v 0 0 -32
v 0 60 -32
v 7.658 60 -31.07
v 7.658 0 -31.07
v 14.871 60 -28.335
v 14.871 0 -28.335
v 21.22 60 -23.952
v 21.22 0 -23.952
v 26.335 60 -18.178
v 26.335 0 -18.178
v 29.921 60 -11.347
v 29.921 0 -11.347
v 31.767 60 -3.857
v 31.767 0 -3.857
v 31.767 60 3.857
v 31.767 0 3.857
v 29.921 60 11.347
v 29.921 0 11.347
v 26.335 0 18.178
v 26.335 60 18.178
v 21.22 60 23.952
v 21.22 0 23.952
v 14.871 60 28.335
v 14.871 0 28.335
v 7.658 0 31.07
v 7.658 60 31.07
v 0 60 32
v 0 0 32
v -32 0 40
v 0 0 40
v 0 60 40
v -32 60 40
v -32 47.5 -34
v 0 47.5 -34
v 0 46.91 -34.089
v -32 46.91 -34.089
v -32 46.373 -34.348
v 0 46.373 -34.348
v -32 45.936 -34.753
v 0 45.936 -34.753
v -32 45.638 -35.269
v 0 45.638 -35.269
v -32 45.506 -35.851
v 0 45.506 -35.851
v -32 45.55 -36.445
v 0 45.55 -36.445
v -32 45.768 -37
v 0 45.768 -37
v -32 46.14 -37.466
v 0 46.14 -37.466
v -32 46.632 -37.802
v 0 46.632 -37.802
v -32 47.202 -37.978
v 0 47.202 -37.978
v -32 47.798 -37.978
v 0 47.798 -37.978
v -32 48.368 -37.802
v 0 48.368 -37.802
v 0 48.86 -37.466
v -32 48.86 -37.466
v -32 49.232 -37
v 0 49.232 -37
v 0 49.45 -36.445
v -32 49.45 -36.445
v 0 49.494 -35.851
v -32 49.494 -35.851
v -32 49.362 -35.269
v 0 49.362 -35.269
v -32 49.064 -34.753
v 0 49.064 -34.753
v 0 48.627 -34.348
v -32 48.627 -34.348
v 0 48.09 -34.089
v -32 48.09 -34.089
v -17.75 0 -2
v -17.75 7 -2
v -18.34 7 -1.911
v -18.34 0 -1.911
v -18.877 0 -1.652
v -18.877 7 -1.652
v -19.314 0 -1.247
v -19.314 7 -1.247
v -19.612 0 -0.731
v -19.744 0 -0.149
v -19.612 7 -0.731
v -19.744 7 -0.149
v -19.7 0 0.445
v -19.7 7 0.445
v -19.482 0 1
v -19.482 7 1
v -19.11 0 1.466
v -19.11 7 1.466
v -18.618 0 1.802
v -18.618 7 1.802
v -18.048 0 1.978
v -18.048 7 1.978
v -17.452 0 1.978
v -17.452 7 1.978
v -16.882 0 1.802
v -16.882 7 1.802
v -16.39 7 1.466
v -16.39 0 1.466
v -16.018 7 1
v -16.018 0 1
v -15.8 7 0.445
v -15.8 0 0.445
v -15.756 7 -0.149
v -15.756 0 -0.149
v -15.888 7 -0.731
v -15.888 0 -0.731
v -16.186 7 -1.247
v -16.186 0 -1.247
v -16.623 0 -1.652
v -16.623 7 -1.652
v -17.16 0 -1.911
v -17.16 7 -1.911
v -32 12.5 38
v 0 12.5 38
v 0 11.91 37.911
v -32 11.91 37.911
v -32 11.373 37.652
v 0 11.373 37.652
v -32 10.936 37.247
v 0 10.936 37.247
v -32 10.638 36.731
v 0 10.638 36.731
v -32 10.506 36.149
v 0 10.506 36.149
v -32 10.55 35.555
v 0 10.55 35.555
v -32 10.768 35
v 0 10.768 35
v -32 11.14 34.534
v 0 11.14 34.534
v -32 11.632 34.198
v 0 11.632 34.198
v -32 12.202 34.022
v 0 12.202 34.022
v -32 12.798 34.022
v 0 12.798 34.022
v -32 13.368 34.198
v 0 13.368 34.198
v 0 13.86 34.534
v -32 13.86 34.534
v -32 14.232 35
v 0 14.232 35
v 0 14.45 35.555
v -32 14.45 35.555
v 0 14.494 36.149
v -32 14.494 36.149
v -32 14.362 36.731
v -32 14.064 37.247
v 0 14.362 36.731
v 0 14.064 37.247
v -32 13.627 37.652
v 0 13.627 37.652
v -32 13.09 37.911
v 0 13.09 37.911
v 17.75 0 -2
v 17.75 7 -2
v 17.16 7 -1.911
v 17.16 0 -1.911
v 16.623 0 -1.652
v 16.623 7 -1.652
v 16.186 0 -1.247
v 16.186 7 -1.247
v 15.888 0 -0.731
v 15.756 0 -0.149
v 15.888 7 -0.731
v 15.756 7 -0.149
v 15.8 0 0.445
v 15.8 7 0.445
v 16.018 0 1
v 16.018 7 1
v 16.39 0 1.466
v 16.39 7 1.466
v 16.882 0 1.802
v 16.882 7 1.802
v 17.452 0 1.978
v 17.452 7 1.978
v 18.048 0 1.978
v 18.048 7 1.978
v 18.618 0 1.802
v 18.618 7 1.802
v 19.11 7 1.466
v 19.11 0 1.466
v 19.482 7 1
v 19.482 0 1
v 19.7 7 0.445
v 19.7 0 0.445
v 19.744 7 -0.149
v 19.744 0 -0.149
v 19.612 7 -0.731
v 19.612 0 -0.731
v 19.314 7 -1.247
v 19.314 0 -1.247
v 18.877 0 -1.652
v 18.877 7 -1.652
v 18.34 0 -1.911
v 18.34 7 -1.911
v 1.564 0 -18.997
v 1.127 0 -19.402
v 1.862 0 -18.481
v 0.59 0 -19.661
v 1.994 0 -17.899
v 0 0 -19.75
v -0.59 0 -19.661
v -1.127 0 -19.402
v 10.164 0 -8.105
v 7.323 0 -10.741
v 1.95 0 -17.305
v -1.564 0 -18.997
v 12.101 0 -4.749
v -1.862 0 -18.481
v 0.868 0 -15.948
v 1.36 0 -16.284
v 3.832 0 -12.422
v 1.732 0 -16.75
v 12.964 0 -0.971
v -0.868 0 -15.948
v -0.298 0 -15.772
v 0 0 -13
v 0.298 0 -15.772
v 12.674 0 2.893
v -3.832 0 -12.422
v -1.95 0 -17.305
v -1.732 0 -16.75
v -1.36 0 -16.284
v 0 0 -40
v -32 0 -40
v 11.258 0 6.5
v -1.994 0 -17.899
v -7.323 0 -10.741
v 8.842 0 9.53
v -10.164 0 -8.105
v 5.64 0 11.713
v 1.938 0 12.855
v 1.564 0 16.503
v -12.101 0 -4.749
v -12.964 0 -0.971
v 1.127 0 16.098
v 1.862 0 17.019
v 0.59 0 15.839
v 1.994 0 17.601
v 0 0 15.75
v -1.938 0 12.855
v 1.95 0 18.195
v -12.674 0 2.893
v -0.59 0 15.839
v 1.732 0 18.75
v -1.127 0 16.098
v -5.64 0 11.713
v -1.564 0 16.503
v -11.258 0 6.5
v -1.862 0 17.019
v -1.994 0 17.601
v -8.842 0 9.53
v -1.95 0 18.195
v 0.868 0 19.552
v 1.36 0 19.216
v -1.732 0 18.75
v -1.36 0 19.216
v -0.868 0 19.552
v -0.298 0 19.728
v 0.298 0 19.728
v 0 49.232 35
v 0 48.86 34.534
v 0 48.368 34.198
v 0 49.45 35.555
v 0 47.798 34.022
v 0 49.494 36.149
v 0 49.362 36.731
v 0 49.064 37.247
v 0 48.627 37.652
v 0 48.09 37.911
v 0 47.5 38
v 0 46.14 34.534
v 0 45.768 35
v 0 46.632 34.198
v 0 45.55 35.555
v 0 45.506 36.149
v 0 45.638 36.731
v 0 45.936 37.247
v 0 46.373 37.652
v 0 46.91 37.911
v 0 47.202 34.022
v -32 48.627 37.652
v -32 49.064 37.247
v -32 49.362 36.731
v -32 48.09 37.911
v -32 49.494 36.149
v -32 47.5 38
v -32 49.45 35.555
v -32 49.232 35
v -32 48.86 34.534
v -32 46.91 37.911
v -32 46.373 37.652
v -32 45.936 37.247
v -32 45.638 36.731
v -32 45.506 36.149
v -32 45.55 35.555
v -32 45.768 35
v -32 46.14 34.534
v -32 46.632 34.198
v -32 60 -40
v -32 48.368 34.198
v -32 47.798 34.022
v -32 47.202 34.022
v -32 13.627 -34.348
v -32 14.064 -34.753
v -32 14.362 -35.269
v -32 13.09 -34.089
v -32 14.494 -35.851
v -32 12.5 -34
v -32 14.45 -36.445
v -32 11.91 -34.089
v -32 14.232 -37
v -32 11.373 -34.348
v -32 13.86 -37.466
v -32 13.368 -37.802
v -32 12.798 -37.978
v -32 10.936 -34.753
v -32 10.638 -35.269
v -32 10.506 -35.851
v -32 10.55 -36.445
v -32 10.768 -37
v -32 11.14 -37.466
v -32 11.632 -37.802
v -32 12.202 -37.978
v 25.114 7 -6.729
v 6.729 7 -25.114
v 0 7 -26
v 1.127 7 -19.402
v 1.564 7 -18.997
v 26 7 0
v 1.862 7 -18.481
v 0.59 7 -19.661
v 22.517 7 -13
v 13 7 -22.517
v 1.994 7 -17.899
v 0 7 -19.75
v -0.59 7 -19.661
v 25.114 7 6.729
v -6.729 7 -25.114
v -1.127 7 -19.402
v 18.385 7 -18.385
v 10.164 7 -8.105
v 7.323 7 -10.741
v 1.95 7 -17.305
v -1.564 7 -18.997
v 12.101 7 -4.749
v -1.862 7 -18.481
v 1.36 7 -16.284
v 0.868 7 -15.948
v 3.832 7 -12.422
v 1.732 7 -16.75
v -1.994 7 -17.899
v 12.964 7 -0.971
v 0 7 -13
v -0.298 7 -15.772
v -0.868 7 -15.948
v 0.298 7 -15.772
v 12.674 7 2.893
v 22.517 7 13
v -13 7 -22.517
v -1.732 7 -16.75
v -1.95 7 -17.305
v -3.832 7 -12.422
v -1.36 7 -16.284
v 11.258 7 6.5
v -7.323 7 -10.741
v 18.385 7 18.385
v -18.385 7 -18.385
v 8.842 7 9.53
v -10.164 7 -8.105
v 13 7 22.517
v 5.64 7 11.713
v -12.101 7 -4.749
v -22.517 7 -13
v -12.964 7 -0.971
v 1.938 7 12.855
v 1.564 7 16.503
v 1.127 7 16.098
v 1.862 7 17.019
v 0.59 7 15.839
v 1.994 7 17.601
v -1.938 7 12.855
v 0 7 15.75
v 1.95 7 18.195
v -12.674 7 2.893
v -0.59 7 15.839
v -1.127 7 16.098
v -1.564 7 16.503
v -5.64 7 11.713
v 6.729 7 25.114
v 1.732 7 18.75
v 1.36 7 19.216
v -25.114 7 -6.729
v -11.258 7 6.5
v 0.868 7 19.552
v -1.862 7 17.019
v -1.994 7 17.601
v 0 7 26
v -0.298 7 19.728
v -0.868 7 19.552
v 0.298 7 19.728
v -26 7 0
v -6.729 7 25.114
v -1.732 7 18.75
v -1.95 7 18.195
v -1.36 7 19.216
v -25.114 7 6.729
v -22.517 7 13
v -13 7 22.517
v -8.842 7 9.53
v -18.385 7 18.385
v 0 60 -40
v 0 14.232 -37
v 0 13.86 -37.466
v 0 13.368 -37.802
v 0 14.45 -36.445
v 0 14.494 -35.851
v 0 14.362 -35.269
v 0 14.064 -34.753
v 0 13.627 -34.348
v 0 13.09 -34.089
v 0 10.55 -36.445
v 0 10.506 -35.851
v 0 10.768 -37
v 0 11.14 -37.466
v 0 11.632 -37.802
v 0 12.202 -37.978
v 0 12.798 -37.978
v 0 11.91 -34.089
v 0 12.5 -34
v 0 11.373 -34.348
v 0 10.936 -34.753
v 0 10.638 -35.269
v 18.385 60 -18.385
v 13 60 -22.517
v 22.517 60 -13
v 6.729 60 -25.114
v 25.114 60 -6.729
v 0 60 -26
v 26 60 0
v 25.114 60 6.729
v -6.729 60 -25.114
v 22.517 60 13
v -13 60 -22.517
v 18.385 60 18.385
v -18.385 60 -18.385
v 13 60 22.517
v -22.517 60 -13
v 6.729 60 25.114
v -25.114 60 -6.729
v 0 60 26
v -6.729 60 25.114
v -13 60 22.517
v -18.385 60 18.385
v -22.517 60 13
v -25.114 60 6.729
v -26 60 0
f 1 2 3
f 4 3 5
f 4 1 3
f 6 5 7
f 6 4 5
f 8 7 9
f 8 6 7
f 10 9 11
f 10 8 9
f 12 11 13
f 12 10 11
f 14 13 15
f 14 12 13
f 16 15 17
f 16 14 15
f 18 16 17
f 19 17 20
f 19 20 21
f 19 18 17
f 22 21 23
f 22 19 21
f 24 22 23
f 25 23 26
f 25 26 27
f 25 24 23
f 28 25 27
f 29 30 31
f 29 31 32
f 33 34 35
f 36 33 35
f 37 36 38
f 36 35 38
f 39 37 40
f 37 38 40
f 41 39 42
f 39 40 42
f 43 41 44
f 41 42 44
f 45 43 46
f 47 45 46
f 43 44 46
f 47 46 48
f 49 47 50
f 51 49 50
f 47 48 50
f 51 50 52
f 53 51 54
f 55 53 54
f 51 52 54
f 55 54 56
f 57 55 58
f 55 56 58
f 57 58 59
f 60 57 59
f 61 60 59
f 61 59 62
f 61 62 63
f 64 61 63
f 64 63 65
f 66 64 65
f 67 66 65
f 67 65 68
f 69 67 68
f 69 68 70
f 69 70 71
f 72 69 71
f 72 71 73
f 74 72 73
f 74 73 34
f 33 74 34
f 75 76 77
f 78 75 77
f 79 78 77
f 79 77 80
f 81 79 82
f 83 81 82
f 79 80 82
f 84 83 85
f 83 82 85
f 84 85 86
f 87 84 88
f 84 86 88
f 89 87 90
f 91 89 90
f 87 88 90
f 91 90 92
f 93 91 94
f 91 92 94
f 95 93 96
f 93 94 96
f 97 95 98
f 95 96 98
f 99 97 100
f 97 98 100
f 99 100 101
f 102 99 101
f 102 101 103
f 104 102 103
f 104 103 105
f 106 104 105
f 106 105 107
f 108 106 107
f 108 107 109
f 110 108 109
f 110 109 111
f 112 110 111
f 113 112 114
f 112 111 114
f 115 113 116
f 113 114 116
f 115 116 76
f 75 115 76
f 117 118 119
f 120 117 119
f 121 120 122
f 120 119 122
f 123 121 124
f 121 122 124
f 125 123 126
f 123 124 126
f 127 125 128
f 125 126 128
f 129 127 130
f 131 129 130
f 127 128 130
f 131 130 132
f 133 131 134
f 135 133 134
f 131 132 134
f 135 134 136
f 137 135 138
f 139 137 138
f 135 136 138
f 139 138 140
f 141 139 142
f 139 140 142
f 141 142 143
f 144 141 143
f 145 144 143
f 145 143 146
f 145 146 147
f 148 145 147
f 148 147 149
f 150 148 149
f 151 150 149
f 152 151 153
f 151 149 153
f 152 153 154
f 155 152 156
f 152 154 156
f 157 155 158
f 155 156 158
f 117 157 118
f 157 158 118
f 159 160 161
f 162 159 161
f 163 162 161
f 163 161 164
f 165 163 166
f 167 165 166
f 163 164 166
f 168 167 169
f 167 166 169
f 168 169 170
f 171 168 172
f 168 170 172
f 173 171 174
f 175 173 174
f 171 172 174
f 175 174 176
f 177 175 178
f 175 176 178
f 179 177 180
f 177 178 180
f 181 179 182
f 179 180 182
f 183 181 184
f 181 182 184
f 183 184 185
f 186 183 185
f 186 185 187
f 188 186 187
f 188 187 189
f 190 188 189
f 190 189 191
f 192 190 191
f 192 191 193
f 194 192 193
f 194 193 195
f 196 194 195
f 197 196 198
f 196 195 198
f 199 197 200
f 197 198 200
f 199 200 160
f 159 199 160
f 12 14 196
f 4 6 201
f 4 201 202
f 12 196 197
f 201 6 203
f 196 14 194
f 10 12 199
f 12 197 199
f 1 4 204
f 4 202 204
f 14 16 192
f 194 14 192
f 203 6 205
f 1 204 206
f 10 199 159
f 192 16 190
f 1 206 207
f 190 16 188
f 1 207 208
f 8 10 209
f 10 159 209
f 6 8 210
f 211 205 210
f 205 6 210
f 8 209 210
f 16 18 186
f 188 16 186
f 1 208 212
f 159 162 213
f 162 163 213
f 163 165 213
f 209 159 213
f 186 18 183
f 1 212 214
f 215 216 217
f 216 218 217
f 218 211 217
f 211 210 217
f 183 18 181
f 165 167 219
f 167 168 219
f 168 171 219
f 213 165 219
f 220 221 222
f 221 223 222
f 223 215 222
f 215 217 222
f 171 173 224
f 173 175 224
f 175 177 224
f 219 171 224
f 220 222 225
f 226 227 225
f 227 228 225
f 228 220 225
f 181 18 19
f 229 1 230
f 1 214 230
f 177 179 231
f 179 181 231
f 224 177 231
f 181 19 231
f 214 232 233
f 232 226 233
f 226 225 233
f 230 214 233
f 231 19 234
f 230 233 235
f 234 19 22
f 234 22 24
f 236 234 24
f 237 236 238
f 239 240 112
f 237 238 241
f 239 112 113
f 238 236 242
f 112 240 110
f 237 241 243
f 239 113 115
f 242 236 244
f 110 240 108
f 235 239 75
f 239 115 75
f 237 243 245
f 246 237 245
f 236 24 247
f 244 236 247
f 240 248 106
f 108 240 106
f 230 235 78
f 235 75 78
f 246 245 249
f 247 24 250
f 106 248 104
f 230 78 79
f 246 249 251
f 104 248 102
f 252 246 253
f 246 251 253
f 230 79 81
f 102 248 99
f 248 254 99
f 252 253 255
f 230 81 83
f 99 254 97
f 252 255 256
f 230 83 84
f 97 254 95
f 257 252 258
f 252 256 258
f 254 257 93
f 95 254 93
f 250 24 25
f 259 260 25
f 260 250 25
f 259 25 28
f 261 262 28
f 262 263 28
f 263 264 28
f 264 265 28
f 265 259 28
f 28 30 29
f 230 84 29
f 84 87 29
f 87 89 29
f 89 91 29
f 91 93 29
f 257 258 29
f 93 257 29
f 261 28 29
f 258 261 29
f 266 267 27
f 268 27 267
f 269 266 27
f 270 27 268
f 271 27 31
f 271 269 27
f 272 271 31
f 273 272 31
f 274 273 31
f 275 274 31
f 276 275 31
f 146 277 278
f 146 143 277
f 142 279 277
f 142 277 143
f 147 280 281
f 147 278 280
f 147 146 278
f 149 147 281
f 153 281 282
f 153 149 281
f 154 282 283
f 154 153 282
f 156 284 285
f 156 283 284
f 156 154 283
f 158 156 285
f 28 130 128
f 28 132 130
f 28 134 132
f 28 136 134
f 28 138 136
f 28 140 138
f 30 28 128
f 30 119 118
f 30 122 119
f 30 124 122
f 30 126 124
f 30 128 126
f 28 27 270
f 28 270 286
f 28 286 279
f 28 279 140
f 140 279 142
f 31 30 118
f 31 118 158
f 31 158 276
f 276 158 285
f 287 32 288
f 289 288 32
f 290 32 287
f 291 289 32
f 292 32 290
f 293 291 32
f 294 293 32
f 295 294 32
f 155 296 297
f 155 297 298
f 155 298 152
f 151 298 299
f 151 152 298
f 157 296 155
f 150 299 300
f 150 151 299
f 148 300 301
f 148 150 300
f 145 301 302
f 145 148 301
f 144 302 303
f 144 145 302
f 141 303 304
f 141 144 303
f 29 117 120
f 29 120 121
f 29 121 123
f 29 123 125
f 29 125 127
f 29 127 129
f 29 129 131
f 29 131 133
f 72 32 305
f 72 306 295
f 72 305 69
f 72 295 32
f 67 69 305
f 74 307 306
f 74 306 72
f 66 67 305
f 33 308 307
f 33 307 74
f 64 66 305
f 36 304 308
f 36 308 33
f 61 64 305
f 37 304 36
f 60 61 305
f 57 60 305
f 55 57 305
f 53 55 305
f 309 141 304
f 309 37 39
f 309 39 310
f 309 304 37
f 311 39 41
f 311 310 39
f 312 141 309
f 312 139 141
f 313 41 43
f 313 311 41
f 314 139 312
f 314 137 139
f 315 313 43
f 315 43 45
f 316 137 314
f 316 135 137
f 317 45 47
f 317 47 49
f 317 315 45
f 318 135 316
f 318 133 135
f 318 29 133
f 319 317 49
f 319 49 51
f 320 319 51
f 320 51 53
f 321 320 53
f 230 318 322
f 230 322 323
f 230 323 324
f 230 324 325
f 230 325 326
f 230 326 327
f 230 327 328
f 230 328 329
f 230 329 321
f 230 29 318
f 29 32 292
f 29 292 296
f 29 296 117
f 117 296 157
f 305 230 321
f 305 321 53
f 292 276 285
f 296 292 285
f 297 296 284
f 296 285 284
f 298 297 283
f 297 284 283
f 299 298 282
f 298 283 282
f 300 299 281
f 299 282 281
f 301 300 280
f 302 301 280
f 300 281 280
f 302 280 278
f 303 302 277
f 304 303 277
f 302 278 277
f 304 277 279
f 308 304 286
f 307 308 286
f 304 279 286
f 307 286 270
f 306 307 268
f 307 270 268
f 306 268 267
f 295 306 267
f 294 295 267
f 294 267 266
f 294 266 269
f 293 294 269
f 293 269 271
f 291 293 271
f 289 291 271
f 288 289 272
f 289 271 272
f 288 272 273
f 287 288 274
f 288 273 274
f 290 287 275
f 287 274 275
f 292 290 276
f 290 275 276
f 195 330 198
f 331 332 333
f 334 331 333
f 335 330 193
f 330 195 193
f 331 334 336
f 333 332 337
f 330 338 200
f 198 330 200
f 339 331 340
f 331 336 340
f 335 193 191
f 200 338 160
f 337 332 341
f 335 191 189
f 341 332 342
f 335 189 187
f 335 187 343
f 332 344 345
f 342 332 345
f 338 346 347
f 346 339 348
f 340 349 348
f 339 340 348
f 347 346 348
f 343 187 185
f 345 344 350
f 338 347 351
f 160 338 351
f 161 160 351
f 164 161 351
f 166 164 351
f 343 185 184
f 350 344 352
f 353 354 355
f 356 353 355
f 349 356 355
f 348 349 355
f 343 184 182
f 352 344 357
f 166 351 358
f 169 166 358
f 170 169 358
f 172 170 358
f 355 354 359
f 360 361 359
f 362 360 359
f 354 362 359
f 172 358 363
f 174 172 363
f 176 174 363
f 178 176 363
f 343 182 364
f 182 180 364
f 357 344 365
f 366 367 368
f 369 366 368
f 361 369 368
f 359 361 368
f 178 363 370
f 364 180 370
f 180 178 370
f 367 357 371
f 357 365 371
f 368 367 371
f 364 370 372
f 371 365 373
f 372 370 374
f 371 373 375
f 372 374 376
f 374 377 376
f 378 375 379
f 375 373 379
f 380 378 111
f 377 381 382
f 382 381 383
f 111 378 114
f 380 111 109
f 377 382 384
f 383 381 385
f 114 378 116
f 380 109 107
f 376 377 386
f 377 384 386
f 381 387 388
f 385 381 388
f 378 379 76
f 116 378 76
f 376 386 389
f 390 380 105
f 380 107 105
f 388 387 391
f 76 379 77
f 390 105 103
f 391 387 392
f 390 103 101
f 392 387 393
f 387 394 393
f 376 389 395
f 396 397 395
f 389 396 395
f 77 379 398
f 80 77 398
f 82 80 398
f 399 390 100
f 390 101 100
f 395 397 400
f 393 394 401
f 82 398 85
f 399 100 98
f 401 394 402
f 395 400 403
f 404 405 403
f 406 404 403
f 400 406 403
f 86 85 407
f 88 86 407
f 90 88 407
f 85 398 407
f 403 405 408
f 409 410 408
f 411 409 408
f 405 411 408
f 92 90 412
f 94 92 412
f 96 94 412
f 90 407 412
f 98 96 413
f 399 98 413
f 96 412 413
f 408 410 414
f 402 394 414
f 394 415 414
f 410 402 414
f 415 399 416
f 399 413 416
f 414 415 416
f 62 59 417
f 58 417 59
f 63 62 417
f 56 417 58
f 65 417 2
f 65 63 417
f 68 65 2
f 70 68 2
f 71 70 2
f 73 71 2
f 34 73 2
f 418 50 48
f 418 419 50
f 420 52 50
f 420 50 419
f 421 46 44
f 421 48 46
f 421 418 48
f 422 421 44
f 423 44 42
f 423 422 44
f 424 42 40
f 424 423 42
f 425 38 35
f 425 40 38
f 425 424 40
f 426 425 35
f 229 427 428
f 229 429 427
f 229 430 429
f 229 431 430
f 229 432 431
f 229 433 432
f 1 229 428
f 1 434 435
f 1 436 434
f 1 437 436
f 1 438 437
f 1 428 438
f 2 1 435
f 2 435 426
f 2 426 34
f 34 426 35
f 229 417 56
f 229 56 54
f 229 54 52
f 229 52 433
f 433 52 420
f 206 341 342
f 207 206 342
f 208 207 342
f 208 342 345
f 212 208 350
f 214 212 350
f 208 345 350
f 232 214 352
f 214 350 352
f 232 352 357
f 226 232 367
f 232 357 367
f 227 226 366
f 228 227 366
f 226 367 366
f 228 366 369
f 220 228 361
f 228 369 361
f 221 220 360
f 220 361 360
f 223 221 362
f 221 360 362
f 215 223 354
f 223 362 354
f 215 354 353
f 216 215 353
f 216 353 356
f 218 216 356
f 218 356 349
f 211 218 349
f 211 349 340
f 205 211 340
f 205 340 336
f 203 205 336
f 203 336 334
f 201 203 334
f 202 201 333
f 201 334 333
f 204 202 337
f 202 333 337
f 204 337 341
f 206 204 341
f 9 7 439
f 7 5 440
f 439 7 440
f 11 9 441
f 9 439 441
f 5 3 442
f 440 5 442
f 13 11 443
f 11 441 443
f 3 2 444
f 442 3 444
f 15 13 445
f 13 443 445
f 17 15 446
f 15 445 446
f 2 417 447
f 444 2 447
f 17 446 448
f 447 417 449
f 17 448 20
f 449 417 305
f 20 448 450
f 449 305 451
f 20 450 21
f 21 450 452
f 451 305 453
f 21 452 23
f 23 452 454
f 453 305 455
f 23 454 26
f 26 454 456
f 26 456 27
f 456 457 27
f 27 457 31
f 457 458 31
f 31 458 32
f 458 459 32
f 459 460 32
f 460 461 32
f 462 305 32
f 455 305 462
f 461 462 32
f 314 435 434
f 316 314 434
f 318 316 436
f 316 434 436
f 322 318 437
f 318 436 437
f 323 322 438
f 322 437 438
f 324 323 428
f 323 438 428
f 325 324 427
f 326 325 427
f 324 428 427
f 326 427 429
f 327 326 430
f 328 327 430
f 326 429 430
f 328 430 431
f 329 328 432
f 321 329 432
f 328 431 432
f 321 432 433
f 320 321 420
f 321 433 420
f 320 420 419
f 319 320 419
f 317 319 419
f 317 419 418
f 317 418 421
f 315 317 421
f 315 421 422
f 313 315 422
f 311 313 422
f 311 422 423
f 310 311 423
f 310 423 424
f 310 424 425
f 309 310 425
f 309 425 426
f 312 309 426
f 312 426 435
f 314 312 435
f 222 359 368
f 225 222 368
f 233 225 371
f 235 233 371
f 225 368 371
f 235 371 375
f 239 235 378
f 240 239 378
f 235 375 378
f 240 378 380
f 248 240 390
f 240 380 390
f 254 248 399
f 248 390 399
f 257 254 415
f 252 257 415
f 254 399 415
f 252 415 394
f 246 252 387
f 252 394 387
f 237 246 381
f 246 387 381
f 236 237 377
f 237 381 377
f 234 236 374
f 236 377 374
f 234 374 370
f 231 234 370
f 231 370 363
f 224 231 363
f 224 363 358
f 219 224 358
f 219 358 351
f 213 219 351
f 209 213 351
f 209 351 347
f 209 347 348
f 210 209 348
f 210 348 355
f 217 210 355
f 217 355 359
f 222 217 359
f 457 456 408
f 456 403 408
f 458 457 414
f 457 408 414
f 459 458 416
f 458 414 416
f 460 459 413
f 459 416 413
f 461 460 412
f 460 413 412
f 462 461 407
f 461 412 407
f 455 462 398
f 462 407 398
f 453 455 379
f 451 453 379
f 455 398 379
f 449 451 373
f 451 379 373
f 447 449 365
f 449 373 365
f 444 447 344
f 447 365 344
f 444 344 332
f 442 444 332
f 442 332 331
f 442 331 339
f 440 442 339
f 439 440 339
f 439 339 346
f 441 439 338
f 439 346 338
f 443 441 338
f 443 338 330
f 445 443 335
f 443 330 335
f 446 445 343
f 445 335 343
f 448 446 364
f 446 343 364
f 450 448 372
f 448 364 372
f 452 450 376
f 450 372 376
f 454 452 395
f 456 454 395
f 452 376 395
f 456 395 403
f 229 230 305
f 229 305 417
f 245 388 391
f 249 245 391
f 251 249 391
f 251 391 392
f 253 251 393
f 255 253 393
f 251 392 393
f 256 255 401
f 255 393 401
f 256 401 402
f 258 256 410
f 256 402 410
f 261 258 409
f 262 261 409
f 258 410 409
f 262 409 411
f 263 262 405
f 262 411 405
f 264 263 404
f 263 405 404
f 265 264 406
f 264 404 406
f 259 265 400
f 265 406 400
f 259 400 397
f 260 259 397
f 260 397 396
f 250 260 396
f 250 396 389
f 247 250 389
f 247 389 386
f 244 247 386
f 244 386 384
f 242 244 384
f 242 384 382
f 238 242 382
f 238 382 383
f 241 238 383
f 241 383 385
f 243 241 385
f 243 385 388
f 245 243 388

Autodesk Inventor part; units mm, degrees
ref_plane "YZ Plane" through (0, 0, 0) normal (1, 0, 0) x (0, 1, 0)
ref_plane "XZ Plane" through (0, 0, 0) normal (0, 1, 0) x (-1, 0, 0)
ref_plane "XY Plane" through (0, 0, 0) normal (0, 0, 1) x (1, 0, 0)
sketch "Boceto1" plane through (0, 0, 0) normal (0, 1, 0) x (-1, 0, 0)
  circle A0 centre (0, 0) radius 26
  circle A1 centre (0, 0) radius 32
  line L0 (0, 40) -> (32, 40)
  line L1 (32, 40) -> (32, -40)
  line L2 (32, -40) -> (0, -40)
  line L3 (0, -40) -> (0, 40)
  dimension "d0" = 52
  dimension "d1" = 64
  dimension "d2" = 40
  dimension "d3" = 80
  dimension "d4" = 32
  dimension "d5" = 32
extrude "Extrusión1" add sketch "Boceto1" along normal blind 67
sketch "Boceto2" plane through (0, 67, 0) normal (0, 1, 0) x (1, 0, 0)
  circle A0 centre (0, 0) radius 26
  dimension "d8" = 52
hole "Agujero1" at (0, 67, 0) direction (0, -1, 0) diameter 52 depth 60
sketch "Boceto3" plane through (0, 0, 0) normal (0, -1, 0) x (1, 0, 0)
  circle A0 centre (0, 0) radius 13
  dimension "d16" = 26
hole "Agujero2" at (0, 0, 0) direction (0, 1, 0) diameter 26 depth 60
sketch "Boceto4" plane through (0, 0, 0) normal (0, -1, 0) x (1, 0, 0)
  circle A0 centre (0, 0) radius 17.75
  circle A1 centre (17.75, 0) radius 2
  circle A2 centre (0, -17.75) radius 2
  circle A3 centre (-17.75, 0) radius 2
  circle A4 centre (0, 17.75) radius 2
  dimension "d24" = 35.5
  dimension "d25" = 4
  dimension "d26" = 4
  dimension "d27" = 4
  dimension "d28" = 4
hole "Agujero3" at (17.75, 0, 0) at (0, 0, -17.75) at (-17.75, 0, 0) at (0, 0, 17.75) direction (0, 1, 0) diameter 4 depth 60
sketch "Boceto5" plane through (0, 67, 0) normal (0, 1, 0) x (1, 0, 0)
  point P0 (0, 0)
  point P1 (0, 0)
hole "Agujero4" at (0, 67, 0) direction (0, -1, 0) diameter 200 depth 7
sketch "Boceto6" plane through (-32, 0, -40) normal (-1, 0, 0) x (0, 0, 1)
  line L0 (4, 12.5) -> (76, 12.5)
  line L1 (76, 12.5) -> (76, 47.5)
  line L2 (76, 47.5) -> (4, 47.5)
  line L3 (4, 47.5) -> (4, 12.5)
  line L4 (4, 12.5) -> (76, 47.5) construction
  line L5 (76, 12.5) -> (4, 47.5) construction
  line L6 (80, 0) -> (80, 60) projected
  line L7 (80, 60) -> (0, 60) projected
  circle A0 centre (4, 47.5) radius 2
  circle A1 centre (76, 47.5) radius 2
  circle A2 centre (76, 12.5) radius 2
  circle A3 centre (4, 12.5) radius 2
  point P0 (40, 0)
  point P1 (40, 30)
  dimension "d43" = 35
  dimension "d44" = 40
  dimension "d45" = 30
  dimension "d46" = 72
  dimension "d47" = 4
  dimension "d48" = 4
  dimension "d49" = 4
  dimension "d50" = 4
hole "Agujero5" at (-32, 47.5, -36) at (-32, 12.5, -36) at (-32, 12.5, 36) at (-32, 47.5, 36) direction (1, 0, 0) diameter 4 depth 32
properties part number "BracketHusillo"
